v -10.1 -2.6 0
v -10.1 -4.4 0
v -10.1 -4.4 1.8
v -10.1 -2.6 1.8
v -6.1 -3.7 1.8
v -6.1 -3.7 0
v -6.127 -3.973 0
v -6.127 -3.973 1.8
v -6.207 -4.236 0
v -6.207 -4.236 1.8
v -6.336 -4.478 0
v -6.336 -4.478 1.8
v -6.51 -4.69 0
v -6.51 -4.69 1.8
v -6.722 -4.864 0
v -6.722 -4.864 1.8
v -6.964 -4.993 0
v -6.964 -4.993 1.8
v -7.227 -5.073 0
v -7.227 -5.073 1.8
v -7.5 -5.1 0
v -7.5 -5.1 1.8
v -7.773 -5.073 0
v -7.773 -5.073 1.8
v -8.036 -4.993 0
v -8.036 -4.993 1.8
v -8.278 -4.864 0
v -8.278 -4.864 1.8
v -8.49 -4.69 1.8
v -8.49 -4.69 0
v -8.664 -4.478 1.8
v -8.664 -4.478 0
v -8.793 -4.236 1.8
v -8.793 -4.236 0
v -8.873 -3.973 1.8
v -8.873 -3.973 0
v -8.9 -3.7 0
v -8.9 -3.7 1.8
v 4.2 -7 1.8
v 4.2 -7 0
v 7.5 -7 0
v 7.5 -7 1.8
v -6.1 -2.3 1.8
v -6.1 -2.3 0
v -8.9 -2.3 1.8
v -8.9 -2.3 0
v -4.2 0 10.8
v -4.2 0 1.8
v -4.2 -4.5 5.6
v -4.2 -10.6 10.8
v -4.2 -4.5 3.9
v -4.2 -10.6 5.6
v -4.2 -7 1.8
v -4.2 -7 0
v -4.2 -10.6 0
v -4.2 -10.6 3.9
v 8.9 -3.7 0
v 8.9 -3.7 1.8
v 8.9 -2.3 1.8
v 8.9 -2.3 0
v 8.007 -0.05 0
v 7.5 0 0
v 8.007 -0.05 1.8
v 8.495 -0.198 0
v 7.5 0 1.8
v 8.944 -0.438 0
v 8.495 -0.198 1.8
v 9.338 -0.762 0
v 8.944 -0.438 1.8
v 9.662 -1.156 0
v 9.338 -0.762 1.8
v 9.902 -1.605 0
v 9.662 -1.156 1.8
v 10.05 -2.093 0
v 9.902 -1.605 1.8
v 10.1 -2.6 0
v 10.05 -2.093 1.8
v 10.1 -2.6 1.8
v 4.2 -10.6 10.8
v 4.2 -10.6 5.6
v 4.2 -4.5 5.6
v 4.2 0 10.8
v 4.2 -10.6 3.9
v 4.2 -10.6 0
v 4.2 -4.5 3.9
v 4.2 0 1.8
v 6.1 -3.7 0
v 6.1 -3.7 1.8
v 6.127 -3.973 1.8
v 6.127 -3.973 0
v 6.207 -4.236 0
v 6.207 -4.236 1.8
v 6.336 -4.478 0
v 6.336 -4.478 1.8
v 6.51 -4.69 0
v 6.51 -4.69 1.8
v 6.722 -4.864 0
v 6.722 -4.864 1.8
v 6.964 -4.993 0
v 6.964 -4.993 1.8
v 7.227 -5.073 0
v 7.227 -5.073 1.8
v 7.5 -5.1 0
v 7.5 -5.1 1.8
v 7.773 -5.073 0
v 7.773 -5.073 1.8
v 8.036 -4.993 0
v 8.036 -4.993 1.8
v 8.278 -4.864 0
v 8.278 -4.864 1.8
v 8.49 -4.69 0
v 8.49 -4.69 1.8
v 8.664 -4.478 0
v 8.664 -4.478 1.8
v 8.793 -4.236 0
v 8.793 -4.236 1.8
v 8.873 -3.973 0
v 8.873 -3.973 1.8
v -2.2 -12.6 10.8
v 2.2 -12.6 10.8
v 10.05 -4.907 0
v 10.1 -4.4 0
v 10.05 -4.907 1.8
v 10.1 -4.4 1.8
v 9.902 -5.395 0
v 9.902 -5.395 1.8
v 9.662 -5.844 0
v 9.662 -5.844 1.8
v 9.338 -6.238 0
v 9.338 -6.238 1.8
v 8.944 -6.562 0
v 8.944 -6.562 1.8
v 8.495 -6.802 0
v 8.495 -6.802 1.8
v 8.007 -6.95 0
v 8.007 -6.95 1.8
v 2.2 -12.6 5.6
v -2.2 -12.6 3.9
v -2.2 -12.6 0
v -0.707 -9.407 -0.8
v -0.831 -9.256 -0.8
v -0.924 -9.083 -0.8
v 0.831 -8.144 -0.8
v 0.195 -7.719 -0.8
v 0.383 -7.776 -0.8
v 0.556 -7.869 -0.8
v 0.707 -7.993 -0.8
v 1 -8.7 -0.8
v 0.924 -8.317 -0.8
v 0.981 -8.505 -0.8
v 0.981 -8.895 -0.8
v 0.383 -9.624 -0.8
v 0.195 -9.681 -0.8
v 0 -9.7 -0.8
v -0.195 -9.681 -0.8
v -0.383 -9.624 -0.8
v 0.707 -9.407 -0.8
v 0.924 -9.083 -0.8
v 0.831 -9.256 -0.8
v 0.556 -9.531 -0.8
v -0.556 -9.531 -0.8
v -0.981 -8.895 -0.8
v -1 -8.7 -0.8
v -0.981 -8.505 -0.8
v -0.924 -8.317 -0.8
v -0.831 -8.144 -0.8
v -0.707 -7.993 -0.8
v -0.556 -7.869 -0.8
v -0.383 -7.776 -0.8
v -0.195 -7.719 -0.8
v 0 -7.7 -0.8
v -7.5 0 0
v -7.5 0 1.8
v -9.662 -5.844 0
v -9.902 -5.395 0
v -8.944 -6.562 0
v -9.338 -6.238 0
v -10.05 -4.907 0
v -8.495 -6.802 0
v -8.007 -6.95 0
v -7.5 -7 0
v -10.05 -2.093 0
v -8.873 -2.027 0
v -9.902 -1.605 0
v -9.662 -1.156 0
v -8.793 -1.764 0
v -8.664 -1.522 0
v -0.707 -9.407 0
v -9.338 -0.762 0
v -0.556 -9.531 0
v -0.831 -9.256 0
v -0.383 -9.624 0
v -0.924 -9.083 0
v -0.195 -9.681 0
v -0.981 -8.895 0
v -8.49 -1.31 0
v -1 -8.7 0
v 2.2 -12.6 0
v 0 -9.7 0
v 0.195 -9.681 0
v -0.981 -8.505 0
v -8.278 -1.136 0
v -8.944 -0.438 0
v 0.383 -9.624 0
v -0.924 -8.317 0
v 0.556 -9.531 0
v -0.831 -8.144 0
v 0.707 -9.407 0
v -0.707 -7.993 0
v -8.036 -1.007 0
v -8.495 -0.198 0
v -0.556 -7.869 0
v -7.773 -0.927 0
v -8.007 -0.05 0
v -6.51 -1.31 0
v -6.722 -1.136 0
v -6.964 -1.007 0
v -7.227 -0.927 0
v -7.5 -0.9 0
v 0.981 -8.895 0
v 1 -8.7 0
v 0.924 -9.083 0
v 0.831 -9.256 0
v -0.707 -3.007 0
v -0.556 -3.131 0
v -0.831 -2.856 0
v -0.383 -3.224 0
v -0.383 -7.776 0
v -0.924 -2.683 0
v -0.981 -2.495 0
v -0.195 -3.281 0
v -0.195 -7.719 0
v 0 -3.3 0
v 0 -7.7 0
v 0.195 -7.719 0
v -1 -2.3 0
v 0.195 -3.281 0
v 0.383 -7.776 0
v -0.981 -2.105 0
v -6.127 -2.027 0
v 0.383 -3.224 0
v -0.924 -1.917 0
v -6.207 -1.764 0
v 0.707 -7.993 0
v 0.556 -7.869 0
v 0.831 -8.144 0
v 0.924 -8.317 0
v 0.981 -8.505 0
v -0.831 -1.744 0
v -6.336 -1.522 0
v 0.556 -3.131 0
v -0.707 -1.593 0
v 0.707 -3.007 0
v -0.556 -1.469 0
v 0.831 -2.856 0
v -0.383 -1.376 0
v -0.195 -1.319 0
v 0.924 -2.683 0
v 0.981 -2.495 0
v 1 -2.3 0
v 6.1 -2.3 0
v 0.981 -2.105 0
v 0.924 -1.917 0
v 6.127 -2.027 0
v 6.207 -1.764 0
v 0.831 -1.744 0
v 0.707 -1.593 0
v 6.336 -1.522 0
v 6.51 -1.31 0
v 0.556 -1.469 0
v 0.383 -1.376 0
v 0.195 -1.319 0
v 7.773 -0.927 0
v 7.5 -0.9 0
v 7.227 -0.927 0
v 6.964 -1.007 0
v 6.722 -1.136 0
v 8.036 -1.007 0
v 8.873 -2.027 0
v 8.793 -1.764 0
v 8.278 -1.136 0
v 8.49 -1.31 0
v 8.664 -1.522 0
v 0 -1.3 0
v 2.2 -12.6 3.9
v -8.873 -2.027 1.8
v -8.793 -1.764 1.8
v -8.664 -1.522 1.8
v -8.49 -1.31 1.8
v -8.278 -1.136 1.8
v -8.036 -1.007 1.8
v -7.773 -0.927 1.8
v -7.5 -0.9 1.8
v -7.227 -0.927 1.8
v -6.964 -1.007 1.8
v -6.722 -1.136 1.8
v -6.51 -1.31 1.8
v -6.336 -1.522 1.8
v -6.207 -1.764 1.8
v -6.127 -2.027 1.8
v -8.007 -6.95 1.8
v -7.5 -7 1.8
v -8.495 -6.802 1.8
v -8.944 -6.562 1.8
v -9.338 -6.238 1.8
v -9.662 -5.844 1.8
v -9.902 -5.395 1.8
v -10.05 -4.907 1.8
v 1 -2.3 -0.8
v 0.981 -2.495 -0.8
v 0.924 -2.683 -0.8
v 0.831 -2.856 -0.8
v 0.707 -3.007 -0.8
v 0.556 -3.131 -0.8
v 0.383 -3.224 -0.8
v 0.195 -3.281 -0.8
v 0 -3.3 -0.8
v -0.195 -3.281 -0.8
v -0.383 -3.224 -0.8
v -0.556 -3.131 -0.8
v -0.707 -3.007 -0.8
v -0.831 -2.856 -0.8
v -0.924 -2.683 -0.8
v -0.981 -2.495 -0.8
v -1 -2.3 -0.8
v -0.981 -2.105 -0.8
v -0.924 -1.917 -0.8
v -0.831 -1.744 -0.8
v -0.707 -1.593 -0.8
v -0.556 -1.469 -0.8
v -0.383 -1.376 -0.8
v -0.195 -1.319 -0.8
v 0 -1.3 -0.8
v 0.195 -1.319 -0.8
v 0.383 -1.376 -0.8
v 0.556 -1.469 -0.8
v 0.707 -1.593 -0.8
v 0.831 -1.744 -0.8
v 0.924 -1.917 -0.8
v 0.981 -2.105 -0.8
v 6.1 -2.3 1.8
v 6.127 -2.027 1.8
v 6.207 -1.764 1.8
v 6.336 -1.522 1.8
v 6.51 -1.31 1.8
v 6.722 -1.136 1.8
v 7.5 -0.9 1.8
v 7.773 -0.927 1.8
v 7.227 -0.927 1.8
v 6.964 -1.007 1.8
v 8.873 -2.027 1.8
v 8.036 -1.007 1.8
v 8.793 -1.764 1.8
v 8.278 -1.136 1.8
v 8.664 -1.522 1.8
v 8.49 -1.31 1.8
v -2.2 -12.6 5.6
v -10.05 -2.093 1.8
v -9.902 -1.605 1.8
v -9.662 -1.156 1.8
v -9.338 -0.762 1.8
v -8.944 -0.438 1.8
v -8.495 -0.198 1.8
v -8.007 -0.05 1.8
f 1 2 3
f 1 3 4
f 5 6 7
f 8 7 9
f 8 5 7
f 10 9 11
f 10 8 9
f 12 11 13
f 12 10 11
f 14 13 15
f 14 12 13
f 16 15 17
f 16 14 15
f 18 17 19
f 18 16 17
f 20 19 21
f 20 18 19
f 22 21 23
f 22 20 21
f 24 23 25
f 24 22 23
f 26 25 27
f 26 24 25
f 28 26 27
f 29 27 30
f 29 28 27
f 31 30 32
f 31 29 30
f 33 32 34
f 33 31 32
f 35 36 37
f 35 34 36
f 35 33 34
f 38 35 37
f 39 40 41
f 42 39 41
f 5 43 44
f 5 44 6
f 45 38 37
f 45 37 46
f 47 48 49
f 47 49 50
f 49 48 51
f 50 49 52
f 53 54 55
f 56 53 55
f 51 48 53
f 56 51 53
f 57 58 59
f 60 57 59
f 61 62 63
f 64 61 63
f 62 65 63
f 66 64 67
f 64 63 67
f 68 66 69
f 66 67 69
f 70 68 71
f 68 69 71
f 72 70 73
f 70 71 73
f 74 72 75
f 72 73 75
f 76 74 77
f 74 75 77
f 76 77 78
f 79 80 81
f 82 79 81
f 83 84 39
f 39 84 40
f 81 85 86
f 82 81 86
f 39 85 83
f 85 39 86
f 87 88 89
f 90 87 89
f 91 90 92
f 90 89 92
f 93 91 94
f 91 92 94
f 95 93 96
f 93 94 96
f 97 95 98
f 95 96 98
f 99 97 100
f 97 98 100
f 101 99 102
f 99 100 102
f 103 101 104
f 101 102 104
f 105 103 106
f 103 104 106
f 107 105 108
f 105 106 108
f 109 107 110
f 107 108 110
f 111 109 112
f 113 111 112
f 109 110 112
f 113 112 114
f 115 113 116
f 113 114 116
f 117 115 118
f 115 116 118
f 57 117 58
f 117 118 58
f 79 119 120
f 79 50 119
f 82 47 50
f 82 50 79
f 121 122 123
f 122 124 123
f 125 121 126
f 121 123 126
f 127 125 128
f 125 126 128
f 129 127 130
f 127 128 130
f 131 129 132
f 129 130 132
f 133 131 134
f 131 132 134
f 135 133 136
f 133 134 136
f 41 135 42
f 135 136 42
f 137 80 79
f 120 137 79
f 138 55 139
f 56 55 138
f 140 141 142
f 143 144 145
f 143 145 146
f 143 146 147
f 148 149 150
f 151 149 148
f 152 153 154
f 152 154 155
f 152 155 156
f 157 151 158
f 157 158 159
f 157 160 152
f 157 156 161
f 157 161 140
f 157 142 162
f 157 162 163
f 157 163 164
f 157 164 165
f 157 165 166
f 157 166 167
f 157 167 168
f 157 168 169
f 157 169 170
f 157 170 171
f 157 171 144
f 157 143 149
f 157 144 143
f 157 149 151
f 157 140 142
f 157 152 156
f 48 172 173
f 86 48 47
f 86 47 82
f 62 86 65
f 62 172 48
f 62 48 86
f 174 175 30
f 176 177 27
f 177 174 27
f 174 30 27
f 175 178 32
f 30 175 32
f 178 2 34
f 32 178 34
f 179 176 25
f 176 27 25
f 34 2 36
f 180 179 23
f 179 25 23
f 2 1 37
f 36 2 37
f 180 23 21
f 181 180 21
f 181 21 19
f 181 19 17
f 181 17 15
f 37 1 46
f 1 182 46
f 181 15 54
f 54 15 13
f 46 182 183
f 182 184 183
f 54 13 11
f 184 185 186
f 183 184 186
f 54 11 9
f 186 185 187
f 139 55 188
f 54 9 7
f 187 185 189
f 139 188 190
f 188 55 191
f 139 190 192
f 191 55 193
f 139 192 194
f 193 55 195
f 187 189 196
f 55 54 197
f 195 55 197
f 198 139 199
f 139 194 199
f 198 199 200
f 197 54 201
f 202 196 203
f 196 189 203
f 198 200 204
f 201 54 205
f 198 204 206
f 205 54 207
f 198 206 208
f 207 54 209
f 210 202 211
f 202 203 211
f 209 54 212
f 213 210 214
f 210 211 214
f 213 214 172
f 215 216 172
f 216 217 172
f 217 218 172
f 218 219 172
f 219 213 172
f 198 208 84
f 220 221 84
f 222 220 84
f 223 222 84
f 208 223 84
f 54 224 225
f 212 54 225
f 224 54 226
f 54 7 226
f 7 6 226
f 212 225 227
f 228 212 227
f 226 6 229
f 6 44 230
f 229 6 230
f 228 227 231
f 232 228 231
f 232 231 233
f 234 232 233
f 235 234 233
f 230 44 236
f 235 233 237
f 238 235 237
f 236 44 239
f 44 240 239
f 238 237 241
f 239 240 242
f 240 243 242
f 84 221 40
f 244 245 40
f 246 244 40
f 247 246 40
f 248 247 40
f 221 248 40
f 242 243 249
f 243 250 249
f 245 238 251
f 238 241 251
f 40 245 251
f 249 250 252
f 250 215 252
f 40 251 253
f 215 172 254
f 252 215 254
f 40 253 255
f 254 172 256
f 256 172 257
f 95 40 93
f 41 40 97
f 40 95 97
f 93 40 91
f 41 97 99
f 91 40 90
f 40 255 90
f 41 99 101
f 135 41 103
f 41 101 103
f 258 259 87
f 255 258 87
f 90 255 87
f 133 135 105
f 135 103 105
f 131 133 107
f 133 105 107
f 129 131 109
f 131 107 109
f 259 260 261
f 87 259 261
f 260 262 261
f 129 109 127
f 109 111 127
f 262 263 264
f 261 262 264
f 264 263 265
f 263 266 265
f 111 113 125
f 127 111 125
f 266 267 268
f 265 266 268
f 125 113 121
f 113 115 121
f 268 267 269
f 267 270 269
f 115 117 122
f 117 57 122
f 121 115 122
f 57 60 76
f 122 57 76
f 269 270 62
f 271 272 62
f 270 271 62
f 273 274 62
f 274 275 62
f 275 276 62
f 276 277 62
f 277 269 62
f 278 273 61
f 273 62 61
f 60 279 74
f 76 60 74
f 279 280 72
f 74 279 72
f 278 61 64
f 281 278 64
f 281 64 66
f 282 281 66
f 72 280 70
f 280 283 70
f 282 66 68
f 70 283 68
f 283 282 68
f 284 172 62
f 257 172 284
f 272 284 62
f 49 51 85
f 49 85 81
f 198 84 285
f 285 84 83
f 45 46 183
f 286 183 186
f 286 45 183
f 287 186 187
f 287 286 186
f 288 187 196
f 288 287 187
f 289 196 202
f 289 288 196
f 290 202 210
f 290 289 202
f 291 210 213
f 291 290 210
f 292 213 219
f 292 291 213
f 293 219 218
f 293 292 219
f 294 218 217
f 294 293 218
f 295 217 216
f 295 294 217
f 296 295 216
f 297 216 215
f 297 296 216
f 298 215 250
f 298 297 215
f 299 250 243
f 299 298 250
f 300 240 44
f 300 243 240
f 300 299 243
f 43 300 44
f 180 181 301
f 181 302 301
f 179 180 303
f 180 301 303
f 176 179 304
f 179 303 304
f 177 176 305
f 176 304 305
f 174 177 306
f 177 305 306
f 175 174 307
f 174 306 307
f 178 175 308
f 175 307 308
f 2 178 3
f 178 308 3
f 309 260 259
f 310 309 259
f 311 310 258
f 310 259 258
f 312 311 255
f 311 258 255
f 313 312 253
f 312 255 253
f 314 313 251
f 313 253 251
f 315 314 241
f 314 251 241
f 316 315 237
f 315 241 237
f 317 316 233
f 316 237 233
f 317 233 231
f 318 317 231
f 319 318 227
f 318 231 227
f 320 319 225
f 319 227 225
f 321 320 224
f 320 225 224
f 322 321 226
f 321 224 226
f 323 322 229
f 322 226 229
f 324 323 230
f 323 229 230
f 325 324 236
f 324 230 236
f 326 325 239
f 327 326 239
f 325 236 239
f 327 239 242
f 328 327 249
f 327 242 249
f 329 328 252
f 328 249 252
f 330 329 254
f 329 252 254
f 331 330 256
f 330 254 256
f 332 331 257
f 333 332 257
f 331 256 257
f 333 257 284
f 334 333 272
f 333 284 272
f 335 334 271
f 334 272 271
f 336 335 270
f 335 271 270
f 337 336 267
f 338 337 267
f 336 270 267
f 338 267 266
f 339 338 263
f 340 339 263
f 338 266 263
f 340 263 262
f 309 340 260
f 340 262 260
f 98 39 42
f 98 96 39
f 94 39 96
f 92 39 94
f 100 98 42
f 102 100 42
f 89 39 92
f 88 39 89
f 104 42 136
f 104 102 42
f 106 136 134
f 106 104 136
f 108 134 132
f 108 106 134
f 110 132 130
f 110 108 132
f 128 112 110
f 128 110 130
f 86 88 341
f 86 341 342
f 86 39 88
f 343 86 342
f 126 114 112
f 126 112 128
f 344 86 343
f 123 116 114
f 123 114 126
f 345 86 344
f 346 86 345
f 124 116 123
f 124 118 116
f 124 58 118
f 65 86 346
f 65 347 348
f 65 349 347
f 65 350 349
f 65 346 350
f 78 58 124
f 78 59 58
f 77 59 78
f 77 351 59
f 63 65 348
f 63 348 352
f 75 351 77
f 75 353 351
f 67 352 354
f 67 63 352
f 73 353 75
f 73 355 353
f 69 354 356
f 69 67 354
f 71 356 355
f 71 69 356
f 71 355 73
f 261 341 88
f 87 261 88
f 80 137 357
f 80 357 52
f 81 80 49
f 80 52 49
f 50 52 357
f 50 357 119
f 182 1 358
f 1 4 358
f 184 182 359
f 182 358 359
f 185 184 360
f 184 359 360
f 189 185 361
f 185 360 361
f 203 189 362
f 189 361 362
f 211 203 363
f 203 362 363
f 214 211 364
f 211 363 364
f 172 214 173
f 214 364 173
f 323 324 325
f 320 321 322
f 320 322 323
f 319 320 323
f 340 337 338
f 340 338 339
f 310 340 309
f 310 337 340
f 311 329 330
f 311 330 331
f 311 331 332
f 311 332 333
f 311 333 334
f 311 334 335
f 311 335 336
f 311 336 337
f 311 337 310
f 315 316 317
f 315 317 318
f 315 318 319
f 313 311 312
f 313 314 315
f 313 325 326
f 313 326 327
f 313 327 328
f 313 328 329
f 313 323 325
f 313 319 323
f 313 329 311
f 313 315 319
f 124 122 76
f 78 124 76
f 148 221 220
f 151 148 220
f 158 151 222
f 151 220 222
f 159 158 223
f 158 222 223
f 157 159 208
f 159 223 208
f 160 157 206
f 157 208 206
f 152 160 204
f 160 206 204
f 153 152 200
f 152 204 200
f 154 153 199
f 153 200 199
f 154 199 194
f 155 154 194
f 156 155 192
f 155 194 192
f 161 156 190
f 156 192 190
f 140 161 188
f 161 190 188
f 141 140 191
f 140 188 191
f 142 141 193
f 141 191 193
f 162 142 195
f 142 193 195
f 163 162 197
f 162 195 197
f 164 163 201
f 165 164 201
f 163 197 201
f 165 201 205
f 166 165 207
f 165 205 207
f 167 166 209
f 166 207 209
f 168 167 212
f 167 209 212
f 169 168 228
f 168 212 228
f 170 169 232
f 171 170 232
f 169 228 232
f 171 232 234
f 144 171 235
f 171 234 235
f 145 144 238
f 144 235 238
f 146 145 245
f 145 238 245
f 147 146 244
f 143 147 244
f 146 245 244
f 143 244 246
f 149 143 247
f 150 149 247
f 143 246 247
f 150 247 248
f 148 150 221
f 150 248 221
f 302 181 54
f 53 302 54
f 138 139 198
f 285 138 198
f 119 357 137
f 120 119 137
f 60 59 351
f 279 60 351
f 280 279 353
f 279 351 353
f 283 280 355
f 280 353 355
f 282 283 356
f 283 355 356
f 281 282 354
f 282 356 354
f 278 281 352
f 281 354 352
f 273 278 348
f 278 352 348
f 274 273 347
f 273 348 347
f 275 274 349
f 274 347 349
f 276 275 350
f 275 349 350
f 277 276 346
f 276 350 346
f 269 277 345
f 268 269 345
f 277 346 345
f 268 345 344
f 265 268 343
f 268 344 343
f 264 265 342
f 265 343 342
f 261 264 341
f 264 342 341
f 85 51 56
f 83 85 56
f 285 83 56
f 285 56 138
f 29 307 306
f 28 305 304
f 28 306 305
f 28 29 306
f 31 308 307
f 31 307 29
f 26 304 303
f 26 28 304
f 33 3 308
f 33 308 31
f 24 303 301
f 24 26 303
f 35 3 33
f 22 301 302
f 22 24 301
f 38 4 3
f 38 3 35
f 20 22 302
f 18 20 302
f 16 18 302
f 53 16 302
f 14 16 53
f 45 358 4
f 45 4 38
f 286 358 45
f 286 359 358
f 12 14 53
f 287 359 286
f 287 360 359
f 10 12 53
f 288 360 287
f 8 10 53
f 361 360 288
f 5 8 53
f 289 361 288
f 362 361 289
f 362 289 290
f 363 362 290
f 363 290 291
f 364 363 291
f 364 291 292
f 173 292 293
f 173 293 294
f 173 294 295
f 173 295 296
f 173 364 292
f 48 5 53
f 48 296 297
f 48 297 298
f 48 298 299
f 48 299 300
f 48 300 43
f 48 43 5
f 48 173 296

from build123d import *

# Parameters (mm, degrees)
F0_W     = 5.9
F0_H     = 7
F0_W_2   = 8.4
F1_DEPTH = 1.8
F0_H_2   = 5.6
F2_DEPTH = 10.8
F3_SIZE  = 2
F4_R     = 1
F5_DEPTH = 0.8
F7_DEPTH = 2.601
F8_W     = 2
F8_H     = 1.7
F8_W_2   = 6.1
F9_DEPTH = 14.301
F10_R    = 2.6


# Not quite as in the source:
# - a pattern or mirror of a feature is missing from the dataset's text; its kind, count and spacing are read off the source's solid


with BuildPart() as f1:
    # F0 (on Top) → F1 (new body)
    with BuildSketch(Plane.XY):
        with Locations((-7.15, -3.5)):
            Rectangle(F0_W, F0_H)
        with Locations((0, -3.5)):
            Rectangle(F0_W_2, F0_H)
        with Locations((7.15, -3.5)):
            Rectangle(F0_W, F0_H)
    extrude(amount=F1_DEPTH)

    # F0 (on Top) → F2 (join)
    with BuildSketch(Plane.XY):
        with Locations((0, -9.8)):
            Rectangle(F0_W_2, F0_H_2)
        with Locations((0, -3.5)):
            Rectangle(F0_W_2, F0_H)
    extrude(amount=F2_DEPTH)

    # F3
    f3_edges = [f1.edges().sort_by_distance(p)[0] for p in [
        (-4.2, -12.6, 5.4),
        (4.2, -12.6, 5.4),
    ]]
    chamfer(f3_edges, length=F3_SIZE)

    # F4 (on face) → F5 (join)
    with BuildSketch(Plane(origin=(0, 0, 0), x_dir=(1, 0, 0), z_dir=(0, 0, -1))):
        with Locations((0, 2.3)):
            Circle(F4_R)
        with Locations((0, 8.7)):
            Circle(F4_R)
    extrude(amount=F5_DEPTH)

    # F6 (on face) → F7 (cut, through all)
    with BuildSketch(Plane.XY.offset(1.8)):
        with BuildLine():
            Line((8.9, -3.7), (8.9, -2.3))
            ThreePointArc((8.9, -2.3), (7.5, -0.9), (6.1, -2.3))
            Line((6.1, -2.3), (6.1, -3.7))
            ThreePointArc((6.1, -3.7), (7.5, -5.1), (8.9, -3.7))
        make_face()
    f7 = extrude(amount=-F7_DEPTH, mode=Mode.SUBTRACT)

    # F7_copies: F7 across plane
    add(f7.mirror(Plane(origin=(0, 0, 0), x_dir=(0, 0, -1), z_dir=(-1, 0, 0))), mode=Mode.SUBTRACT)

    # F8 (on face) → F9 (cut, through all)
    with BuildSketch(Plane(origin=(-4.2, 0, 0), x_dir=(0, -1, 0), z_dir=(-1, 0, 0))):
        with Locations((11.6, 4.75)):
            Rectangle(F8_W, F8_H)
        with Locations((7.55, 4.75)):
            Rectangle(F8_W_2, F8_H)
    extrude(amount=-F9_DEPTH, mode=Mode.SUBTRACT)

    # F10
    f10_edges = [f1.edges().sort_by_distance(p)[0] for p in [
        (-10.1, -7, 0.9),
        (-10.1, 0, 0.9),
        (10.1, -7, 0.9),
        (10.1, 0, 0.9),
    ]]
    fillet(f10_edges, radius=F10_R)


solid = f1.part
